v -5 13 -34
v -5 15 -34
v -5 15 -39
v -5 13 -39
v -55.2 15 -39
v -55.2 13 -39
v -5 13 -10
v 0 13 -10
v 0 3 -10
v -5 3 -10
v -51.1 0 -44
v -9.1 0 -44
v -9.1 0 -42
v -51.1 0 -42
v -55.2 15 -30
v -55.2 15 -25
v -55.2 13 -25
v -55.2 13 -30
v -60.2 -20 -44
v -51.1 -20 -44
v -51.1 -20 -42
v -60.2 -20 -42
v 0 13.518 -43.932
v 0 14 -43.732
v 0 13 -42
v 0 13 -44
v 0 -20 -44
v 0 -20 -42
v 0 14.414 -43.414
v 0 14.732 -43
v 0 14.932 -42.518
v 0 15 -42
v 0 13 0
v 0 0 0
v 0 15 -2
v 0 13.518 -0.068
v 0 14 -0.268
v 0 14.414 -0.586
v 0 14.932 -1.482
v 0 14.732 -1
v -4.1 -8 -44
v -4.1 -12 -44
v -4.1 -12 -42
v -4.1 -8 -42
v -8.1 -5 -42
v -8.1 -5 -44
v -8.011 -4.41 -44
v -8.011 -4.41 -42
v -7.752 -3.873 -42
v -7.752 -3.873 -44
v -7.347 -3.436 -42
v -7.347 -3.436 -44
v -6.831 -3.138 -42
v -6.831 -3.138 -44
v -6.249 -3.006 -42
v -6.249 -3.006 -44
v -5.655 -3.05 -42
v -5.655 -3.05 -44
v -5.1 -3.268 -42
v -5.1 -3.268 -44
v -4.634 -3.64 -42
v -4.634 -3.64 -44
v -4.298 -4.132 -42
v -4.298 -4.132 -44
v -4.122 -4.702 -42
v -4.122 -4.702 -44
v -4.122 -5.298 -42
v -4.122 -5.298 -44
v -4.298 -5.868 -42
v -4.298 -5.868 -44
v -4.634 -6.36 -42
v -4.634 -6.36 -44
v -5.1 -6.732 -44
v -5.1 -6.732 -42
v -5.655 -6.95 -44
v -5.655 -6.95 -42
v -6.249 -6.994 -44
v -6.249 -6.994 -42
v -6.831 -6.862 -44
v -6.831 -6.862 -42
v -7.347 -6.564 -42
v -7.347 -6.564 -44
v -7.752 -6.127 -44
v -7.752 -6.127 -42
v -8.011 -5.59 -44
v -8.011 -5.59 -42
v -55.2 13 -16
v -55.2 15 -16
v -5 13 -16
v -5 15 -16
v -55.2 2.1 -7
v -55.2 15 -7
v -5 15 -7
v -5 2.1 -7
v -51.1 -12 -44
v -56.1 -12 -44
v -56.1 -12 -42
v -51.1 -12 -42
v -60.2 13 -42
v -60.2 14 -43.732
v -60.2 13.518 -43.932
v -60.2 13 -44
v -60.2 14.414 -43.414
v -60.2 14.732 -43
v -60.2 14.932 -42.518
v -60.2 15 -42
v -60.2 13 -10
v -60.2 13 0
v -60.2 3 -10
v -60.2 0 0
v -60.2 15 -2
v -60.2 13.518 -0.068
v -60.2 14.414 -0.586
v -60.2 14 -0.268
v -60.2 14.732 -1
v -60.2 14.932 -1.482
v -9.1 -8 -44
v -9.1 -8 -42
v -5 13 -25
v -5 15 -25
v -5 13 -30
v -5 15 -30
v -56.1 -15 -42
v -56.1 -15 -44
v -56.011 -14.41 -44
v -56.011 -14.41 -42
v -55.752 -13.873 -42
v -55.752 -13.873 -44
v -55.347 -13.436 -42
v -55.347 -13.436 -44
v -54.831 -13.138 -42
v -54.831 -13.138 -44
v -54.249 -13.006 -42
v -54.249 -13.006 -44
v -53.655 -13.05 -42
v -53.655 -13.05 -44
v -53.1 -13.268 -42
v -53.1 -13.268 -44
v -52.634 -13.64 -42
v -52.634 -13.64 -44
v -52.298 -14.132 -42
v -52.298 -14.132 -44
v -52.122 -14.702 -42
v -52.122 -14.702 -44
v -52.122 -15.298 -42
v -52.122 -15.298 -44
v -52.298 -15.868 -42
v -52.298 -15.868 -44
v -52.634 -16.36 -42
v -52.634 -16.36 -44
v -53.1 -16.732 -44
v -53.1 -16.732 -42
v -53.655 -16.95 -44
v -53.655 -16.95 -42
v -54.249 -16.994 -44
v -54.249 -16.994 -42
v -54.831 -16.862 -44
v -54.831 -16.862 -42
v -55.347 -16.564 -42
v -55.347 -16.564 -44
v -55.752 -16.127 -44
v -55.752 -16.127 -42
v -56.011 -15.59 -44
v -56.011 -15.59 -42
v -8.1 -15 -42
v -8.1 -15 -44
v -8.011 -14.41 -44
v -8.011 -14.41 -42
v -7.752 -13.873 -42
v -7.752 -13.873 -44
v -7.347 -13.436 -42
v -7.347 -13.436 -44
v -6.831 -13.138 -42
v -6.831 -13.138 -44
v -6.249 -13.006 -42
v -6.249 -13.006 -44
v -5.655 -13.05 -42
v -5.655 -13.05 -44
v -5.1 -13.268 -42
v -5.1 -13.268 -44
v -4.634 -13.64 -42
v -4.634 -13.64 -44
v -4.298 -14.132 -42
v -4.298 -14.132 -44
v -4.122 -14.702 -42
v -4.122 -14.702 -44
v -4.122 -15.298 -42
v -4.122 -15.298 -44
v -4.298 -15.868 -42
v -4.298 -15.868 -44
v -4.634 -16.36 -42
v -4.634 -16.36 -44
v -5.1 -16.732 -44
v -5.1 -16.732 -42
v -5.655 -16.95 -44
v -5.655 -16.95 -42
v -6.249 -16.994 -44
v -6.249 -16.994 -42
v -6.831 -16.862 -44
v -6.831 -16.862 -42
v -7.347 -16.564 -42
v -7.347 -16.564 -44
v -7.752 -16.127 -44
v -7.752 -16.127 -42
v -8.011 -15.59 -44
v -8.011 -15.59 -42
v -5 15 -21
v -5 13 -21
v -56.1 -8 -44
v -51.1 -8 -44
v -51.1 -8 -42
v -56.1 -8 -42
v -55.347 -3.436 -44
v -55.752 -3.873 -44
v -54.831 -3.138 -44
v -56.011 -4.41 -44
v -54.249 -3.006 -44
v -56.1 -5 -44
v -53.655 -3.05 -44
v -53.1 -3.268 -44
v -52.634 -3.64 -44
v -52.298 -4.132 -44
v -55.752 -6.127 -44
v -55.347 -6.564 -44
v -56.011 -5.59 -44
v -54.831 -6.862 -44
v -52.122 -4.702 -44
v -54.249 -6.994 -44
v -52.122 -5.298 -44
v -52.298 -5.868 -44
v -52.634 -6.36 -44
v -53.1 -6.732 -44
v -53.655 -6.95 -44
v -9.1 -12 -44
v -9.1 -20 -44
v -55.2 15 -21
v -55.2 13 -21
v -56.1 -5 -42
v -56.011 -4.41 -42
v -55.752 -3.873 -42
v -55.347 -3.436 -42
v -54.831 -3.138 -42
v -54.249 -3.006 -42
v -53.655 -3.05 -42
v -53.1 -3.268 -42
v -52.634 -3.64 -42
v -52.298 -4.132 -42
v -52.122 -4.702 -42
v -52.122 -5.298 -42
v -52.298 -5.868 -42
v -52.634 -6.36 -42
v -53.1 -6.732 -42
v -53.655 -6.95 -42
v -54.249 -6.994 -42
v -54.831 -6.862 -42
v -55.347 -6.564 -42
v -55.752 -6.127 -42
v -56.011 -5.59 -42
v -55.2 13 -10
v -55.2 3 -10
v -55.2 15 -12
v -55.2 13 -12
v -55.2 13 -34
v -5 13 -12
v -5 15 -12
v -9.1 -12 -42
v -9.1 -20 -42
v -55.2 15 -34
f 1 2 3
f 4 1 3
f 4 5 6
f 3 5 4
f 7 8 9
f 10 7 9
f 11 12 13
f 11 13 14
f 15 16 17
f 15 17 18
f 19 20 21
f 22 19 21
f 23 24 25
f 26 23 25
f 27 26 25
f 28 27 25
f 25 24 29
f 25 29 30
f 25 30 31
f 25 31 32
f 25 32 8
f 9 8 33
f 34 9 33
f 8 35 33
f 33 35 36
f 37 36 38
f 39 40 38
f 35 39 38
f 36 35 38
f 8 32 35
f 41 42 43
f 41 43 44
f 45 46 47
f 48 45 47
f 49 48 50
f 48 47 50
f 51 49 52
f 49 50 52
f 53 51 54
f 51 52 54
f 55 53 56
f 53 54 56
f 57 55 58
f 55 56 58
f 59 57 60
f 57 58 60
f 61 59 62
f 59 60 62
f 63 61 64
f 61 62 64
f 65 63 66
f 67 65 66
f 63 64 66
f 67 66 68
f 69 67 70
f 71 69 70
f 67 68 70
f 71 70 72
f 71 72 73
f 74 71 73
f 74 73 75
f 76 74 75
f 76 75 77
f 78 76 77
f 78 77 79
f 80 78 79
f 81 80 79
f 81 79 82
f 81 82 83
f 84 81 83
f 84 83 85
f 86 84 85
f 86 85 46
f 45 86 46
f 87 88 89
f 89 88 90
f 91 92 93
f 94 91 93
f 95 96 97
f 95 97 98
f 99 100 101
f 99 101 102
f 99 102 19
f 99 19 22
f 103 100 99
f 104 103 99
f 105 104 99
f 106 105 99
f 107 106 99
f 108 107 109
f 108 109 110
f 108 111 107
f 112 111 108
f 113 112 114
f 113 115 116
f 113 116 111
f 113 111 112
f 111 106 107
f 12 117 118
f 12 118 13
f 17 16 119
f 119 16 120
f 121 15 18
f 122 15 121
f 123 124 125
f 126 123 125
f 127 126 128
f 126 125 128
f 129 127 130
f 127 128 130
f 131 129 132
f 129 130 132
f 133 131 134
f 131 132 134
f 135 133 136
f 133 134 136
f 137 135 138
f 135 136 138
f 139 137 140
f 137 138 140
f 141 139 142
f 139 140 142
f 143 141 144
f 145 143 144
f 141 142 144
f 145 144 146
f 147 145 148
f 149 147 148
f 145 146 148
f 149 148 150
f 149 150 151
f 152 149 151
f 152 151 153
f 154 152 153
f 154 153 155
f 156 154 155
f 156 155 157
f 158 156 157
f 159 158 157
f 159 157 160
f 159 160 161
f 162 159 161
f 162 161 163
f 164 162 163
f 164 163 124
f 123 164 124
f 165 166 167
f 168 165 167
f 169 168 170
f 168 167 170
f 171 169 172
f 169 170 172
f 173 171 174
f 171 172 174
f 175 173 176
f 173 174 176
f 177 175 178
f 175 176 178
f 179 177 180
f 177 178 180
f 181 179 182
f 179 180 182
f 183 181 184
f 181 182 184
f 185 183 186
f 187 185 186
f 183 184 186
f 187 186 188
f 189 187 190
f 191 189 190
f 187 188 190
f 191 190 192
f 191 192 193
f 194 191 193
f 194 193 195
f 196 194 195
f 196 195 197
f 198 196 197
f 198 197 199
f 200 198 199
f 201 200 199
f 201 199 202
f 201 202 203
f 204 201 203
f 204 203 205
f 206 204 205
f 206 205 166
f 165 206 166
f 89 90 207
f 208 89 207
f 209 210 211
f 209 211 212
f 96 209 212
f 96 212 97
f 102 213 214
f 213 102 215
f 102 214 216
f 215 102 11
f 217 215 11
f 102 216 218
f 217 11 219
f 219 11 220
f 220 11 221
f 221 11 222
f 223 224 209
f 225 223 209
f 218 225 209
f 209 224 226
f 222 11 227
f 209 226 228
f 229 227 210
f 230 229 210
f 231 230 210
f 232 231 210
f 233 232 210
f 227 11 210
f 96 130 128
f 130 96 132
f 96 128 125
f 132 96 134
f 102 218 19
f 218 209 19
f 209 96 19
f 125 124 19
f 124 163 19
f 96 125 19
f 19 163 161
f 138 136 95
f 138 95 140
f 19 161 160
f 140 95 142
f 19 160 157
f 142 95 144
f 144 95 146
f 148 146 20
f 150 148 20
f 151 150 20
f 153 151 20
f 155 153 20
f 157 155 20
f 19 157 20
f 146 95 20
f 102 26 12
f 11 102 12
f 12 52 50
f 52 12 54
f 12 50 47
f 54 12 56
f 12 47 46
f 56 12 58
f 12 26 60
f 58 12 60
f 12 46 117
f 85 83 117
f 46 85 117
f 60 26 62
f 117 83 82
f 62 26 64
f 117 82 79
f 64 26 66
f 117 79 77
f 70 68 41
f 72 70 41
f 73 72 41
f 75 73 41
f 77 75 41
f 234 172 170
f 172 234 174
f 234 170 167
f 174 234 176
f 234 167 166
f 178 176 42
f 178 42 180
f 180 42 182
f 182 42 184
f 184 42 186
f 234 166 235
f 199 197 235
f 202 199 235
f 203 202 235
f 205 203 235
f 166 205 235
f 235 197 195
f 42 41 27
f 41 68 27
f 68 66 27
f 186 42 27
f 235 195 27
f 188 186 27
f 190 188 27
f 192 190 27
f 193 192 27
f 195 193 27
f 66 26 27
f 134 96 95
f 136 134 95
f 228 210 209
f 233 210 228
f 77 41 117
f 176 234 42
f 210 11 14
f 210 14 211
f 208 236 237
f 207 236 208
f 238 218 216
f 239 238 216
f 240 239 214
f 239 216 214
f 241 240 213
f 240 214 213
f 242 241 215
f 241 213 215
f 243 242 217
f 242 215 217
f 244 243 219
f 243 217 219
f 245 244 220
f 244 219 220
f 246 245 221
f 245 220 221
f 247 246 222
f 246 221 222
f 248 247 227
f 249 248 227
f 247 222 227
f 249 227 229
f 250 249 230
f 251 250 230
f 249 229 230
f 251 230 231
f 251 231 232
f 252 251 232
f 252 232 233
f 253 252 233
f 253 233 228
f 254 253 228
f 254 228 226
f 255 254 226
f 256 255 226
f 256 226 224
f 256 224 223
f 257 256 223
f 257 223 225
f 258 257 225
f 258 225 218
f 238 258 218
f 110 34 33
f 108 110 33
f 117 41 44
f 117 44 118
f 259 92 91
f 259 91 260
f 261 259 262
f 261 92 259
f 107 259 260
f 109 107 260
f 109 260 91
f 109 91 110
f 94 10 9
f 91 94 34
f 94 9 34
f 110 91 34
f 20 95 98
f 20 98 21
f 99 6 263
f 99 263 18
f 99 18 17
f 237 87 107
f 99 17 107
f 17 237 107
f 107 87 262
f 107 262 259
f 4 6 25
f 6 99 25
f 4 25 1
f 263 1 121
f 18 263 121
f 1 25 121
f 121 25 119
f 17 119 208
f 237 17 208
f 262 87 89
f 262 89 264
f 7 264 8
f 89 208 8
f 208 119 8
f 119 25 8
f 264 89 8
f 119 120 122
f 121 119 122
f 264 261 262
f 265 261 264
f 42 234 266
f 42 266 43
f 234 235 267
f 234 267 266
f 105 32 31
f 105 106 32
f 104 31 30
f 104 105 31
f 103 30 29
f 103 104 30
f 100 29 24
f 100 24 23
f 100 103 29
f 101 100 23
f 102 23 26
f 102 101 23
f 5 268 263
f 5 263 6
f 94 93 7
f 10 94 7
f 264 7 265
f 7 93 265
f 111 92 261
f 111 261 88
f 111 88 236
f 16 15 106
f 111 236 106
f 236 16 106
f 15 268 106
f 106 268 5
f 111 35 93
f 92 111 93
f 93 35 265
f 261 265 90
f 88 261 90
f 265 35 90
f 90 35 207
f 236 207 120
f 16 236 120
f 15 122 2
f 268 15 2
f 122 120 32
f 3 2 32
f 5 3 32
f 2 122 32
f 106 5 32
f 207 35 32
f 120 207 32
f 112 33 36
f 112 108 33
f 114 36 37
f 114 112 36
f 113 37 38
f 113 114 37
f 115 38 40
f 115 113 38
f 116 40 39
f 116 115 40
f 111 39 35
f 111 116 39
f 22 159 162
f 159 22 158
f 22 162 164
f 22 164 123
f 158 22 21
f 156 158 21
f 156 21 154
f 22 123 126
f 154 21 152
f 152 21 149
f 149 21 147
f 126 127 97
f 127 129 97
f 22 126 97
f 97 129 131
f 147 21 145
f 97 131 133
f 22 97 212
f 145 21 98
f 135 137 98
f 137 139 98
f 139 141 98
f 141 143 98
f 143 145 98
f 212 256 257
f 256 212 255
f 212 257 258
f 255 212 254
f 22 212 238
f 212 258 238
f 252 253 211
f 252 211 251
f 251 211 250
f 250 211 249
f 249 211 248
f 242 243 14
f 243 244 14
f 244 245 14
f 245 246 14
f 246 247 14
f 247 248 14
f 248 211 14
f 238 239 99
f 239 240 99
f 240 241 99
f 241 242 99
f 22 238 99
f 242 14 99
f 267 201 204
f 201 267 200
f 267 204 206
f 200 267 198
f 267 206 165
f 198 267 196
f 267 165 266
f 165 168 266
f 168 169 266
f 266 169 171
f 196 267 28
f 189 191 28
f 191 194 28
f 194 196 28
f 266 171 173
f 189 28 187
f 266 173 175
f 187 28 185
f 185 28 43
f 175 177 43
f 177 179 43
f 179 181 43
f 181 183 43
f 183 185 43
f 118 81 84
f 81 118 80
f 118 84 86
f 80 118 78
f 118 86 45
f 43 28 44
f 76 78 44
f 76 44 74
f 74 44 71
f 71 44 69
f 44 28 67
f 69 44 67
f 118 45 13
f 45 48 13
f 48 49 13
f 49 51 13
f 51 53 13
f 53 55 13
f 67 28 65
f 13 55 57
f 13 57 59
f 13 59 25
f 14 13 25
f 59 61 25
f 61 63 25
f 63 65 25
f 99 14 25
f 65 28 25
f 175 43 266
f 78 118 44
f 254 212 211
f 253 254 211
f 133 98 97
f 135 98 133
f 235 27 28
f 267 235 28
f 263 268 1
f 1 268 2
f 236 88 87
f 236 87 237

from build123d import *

# Parameters (mm, degrees)
BOSS_EXTRUDE1_DEPTH = 60.2
SKETCH3_R           = 2
CUT_EXTRUDE1_DEPTH  = 20
SKETCH4_W           = 50.2
SKETCH4_H           = 5
CUT_EXTRUDE2_DEPTH  = 20
LPATTERN1_COUNT     = 4
LPATTERN1_PITCH     = 9
FILLET1_R           = 2


with BuildPart() as part:
    # Sketch1 → Boss-Extrude1 (new body)
    with BuildSketch(Plane(origin=(0, 0, 0), x_dir=(0, 0, -1), z_dir=(1, 0, 0))):
        Polygon((0, 0), (0, 15), (44, 15), (44, -20), (42, -20), (42, 13), (10, 13), (10, 3), align=None)
    extrude(amount=-BOSS_EXTRUDE1_DEPTH)

    # Sketch3 → Cut-Extrude1 (cut)
    with BuildSketch(Plane(origin=(0, 0, -44), x_dir=(-1, 0, 0), z_dir=(0, 0, -1))):
        with Locations((54.1, -15)):
            Circle(SKETCH3_R)
        with Locations((54.1, -5)):
            Circle(SKETCH3_R)
        with Locations((6.1, -15)):
            Circle(SKETCH3_R)
        with Locations((6.1, -5)):
            Circle(SKETCH3_R)
        Polygon((9.1, -8), (9.1, 0), (51.1, 0), (51.1, -8), (56.1, -8), (56.1, -12), (51.1, -12), (51.1, -20), (9.1, -20), (9.1, -12), (4.1, -12), (4.1, -8), align=None)
    extrude(amount=-CUT_EXTRUDE1_DEPTH, mode=Mode.SUBTRACT)

    # Sketch4 → Cut-Extrude2 (cut)
    with BuildSketch(Plane(origin=(0, 15, 0), x_dir=(1, 0, 0), z_dir=(0, 1, 0))):
        with Locations((-30.1, 36.5)):
            Rectangle(SKETCH4_W, SKETCH4_H)
    cut_extrude2 = extrude(amount=-CUT_EXTRUDE2_DEPTH, mode=Mode.SUBTRACT)

    # LPattern1: Cut-Extrude2 ×4
    with Locations(*[(0, 0, i * LPATTERN1_PITCH) for i in range(1, LPATTERN1_COUNT)]):
        add(cut_extrude2, mode=Mode.SUBTRACT)

    # Fillet1
    fillet1_edges = [part.edges().sort_by_distance(p)[0] for p in [
        (-30.1, 15, 0),
        (-30.1, 15, -44),
    ]]
    fillet(fillet1_edges, radius=FILLET1_R)


solid = part.part
